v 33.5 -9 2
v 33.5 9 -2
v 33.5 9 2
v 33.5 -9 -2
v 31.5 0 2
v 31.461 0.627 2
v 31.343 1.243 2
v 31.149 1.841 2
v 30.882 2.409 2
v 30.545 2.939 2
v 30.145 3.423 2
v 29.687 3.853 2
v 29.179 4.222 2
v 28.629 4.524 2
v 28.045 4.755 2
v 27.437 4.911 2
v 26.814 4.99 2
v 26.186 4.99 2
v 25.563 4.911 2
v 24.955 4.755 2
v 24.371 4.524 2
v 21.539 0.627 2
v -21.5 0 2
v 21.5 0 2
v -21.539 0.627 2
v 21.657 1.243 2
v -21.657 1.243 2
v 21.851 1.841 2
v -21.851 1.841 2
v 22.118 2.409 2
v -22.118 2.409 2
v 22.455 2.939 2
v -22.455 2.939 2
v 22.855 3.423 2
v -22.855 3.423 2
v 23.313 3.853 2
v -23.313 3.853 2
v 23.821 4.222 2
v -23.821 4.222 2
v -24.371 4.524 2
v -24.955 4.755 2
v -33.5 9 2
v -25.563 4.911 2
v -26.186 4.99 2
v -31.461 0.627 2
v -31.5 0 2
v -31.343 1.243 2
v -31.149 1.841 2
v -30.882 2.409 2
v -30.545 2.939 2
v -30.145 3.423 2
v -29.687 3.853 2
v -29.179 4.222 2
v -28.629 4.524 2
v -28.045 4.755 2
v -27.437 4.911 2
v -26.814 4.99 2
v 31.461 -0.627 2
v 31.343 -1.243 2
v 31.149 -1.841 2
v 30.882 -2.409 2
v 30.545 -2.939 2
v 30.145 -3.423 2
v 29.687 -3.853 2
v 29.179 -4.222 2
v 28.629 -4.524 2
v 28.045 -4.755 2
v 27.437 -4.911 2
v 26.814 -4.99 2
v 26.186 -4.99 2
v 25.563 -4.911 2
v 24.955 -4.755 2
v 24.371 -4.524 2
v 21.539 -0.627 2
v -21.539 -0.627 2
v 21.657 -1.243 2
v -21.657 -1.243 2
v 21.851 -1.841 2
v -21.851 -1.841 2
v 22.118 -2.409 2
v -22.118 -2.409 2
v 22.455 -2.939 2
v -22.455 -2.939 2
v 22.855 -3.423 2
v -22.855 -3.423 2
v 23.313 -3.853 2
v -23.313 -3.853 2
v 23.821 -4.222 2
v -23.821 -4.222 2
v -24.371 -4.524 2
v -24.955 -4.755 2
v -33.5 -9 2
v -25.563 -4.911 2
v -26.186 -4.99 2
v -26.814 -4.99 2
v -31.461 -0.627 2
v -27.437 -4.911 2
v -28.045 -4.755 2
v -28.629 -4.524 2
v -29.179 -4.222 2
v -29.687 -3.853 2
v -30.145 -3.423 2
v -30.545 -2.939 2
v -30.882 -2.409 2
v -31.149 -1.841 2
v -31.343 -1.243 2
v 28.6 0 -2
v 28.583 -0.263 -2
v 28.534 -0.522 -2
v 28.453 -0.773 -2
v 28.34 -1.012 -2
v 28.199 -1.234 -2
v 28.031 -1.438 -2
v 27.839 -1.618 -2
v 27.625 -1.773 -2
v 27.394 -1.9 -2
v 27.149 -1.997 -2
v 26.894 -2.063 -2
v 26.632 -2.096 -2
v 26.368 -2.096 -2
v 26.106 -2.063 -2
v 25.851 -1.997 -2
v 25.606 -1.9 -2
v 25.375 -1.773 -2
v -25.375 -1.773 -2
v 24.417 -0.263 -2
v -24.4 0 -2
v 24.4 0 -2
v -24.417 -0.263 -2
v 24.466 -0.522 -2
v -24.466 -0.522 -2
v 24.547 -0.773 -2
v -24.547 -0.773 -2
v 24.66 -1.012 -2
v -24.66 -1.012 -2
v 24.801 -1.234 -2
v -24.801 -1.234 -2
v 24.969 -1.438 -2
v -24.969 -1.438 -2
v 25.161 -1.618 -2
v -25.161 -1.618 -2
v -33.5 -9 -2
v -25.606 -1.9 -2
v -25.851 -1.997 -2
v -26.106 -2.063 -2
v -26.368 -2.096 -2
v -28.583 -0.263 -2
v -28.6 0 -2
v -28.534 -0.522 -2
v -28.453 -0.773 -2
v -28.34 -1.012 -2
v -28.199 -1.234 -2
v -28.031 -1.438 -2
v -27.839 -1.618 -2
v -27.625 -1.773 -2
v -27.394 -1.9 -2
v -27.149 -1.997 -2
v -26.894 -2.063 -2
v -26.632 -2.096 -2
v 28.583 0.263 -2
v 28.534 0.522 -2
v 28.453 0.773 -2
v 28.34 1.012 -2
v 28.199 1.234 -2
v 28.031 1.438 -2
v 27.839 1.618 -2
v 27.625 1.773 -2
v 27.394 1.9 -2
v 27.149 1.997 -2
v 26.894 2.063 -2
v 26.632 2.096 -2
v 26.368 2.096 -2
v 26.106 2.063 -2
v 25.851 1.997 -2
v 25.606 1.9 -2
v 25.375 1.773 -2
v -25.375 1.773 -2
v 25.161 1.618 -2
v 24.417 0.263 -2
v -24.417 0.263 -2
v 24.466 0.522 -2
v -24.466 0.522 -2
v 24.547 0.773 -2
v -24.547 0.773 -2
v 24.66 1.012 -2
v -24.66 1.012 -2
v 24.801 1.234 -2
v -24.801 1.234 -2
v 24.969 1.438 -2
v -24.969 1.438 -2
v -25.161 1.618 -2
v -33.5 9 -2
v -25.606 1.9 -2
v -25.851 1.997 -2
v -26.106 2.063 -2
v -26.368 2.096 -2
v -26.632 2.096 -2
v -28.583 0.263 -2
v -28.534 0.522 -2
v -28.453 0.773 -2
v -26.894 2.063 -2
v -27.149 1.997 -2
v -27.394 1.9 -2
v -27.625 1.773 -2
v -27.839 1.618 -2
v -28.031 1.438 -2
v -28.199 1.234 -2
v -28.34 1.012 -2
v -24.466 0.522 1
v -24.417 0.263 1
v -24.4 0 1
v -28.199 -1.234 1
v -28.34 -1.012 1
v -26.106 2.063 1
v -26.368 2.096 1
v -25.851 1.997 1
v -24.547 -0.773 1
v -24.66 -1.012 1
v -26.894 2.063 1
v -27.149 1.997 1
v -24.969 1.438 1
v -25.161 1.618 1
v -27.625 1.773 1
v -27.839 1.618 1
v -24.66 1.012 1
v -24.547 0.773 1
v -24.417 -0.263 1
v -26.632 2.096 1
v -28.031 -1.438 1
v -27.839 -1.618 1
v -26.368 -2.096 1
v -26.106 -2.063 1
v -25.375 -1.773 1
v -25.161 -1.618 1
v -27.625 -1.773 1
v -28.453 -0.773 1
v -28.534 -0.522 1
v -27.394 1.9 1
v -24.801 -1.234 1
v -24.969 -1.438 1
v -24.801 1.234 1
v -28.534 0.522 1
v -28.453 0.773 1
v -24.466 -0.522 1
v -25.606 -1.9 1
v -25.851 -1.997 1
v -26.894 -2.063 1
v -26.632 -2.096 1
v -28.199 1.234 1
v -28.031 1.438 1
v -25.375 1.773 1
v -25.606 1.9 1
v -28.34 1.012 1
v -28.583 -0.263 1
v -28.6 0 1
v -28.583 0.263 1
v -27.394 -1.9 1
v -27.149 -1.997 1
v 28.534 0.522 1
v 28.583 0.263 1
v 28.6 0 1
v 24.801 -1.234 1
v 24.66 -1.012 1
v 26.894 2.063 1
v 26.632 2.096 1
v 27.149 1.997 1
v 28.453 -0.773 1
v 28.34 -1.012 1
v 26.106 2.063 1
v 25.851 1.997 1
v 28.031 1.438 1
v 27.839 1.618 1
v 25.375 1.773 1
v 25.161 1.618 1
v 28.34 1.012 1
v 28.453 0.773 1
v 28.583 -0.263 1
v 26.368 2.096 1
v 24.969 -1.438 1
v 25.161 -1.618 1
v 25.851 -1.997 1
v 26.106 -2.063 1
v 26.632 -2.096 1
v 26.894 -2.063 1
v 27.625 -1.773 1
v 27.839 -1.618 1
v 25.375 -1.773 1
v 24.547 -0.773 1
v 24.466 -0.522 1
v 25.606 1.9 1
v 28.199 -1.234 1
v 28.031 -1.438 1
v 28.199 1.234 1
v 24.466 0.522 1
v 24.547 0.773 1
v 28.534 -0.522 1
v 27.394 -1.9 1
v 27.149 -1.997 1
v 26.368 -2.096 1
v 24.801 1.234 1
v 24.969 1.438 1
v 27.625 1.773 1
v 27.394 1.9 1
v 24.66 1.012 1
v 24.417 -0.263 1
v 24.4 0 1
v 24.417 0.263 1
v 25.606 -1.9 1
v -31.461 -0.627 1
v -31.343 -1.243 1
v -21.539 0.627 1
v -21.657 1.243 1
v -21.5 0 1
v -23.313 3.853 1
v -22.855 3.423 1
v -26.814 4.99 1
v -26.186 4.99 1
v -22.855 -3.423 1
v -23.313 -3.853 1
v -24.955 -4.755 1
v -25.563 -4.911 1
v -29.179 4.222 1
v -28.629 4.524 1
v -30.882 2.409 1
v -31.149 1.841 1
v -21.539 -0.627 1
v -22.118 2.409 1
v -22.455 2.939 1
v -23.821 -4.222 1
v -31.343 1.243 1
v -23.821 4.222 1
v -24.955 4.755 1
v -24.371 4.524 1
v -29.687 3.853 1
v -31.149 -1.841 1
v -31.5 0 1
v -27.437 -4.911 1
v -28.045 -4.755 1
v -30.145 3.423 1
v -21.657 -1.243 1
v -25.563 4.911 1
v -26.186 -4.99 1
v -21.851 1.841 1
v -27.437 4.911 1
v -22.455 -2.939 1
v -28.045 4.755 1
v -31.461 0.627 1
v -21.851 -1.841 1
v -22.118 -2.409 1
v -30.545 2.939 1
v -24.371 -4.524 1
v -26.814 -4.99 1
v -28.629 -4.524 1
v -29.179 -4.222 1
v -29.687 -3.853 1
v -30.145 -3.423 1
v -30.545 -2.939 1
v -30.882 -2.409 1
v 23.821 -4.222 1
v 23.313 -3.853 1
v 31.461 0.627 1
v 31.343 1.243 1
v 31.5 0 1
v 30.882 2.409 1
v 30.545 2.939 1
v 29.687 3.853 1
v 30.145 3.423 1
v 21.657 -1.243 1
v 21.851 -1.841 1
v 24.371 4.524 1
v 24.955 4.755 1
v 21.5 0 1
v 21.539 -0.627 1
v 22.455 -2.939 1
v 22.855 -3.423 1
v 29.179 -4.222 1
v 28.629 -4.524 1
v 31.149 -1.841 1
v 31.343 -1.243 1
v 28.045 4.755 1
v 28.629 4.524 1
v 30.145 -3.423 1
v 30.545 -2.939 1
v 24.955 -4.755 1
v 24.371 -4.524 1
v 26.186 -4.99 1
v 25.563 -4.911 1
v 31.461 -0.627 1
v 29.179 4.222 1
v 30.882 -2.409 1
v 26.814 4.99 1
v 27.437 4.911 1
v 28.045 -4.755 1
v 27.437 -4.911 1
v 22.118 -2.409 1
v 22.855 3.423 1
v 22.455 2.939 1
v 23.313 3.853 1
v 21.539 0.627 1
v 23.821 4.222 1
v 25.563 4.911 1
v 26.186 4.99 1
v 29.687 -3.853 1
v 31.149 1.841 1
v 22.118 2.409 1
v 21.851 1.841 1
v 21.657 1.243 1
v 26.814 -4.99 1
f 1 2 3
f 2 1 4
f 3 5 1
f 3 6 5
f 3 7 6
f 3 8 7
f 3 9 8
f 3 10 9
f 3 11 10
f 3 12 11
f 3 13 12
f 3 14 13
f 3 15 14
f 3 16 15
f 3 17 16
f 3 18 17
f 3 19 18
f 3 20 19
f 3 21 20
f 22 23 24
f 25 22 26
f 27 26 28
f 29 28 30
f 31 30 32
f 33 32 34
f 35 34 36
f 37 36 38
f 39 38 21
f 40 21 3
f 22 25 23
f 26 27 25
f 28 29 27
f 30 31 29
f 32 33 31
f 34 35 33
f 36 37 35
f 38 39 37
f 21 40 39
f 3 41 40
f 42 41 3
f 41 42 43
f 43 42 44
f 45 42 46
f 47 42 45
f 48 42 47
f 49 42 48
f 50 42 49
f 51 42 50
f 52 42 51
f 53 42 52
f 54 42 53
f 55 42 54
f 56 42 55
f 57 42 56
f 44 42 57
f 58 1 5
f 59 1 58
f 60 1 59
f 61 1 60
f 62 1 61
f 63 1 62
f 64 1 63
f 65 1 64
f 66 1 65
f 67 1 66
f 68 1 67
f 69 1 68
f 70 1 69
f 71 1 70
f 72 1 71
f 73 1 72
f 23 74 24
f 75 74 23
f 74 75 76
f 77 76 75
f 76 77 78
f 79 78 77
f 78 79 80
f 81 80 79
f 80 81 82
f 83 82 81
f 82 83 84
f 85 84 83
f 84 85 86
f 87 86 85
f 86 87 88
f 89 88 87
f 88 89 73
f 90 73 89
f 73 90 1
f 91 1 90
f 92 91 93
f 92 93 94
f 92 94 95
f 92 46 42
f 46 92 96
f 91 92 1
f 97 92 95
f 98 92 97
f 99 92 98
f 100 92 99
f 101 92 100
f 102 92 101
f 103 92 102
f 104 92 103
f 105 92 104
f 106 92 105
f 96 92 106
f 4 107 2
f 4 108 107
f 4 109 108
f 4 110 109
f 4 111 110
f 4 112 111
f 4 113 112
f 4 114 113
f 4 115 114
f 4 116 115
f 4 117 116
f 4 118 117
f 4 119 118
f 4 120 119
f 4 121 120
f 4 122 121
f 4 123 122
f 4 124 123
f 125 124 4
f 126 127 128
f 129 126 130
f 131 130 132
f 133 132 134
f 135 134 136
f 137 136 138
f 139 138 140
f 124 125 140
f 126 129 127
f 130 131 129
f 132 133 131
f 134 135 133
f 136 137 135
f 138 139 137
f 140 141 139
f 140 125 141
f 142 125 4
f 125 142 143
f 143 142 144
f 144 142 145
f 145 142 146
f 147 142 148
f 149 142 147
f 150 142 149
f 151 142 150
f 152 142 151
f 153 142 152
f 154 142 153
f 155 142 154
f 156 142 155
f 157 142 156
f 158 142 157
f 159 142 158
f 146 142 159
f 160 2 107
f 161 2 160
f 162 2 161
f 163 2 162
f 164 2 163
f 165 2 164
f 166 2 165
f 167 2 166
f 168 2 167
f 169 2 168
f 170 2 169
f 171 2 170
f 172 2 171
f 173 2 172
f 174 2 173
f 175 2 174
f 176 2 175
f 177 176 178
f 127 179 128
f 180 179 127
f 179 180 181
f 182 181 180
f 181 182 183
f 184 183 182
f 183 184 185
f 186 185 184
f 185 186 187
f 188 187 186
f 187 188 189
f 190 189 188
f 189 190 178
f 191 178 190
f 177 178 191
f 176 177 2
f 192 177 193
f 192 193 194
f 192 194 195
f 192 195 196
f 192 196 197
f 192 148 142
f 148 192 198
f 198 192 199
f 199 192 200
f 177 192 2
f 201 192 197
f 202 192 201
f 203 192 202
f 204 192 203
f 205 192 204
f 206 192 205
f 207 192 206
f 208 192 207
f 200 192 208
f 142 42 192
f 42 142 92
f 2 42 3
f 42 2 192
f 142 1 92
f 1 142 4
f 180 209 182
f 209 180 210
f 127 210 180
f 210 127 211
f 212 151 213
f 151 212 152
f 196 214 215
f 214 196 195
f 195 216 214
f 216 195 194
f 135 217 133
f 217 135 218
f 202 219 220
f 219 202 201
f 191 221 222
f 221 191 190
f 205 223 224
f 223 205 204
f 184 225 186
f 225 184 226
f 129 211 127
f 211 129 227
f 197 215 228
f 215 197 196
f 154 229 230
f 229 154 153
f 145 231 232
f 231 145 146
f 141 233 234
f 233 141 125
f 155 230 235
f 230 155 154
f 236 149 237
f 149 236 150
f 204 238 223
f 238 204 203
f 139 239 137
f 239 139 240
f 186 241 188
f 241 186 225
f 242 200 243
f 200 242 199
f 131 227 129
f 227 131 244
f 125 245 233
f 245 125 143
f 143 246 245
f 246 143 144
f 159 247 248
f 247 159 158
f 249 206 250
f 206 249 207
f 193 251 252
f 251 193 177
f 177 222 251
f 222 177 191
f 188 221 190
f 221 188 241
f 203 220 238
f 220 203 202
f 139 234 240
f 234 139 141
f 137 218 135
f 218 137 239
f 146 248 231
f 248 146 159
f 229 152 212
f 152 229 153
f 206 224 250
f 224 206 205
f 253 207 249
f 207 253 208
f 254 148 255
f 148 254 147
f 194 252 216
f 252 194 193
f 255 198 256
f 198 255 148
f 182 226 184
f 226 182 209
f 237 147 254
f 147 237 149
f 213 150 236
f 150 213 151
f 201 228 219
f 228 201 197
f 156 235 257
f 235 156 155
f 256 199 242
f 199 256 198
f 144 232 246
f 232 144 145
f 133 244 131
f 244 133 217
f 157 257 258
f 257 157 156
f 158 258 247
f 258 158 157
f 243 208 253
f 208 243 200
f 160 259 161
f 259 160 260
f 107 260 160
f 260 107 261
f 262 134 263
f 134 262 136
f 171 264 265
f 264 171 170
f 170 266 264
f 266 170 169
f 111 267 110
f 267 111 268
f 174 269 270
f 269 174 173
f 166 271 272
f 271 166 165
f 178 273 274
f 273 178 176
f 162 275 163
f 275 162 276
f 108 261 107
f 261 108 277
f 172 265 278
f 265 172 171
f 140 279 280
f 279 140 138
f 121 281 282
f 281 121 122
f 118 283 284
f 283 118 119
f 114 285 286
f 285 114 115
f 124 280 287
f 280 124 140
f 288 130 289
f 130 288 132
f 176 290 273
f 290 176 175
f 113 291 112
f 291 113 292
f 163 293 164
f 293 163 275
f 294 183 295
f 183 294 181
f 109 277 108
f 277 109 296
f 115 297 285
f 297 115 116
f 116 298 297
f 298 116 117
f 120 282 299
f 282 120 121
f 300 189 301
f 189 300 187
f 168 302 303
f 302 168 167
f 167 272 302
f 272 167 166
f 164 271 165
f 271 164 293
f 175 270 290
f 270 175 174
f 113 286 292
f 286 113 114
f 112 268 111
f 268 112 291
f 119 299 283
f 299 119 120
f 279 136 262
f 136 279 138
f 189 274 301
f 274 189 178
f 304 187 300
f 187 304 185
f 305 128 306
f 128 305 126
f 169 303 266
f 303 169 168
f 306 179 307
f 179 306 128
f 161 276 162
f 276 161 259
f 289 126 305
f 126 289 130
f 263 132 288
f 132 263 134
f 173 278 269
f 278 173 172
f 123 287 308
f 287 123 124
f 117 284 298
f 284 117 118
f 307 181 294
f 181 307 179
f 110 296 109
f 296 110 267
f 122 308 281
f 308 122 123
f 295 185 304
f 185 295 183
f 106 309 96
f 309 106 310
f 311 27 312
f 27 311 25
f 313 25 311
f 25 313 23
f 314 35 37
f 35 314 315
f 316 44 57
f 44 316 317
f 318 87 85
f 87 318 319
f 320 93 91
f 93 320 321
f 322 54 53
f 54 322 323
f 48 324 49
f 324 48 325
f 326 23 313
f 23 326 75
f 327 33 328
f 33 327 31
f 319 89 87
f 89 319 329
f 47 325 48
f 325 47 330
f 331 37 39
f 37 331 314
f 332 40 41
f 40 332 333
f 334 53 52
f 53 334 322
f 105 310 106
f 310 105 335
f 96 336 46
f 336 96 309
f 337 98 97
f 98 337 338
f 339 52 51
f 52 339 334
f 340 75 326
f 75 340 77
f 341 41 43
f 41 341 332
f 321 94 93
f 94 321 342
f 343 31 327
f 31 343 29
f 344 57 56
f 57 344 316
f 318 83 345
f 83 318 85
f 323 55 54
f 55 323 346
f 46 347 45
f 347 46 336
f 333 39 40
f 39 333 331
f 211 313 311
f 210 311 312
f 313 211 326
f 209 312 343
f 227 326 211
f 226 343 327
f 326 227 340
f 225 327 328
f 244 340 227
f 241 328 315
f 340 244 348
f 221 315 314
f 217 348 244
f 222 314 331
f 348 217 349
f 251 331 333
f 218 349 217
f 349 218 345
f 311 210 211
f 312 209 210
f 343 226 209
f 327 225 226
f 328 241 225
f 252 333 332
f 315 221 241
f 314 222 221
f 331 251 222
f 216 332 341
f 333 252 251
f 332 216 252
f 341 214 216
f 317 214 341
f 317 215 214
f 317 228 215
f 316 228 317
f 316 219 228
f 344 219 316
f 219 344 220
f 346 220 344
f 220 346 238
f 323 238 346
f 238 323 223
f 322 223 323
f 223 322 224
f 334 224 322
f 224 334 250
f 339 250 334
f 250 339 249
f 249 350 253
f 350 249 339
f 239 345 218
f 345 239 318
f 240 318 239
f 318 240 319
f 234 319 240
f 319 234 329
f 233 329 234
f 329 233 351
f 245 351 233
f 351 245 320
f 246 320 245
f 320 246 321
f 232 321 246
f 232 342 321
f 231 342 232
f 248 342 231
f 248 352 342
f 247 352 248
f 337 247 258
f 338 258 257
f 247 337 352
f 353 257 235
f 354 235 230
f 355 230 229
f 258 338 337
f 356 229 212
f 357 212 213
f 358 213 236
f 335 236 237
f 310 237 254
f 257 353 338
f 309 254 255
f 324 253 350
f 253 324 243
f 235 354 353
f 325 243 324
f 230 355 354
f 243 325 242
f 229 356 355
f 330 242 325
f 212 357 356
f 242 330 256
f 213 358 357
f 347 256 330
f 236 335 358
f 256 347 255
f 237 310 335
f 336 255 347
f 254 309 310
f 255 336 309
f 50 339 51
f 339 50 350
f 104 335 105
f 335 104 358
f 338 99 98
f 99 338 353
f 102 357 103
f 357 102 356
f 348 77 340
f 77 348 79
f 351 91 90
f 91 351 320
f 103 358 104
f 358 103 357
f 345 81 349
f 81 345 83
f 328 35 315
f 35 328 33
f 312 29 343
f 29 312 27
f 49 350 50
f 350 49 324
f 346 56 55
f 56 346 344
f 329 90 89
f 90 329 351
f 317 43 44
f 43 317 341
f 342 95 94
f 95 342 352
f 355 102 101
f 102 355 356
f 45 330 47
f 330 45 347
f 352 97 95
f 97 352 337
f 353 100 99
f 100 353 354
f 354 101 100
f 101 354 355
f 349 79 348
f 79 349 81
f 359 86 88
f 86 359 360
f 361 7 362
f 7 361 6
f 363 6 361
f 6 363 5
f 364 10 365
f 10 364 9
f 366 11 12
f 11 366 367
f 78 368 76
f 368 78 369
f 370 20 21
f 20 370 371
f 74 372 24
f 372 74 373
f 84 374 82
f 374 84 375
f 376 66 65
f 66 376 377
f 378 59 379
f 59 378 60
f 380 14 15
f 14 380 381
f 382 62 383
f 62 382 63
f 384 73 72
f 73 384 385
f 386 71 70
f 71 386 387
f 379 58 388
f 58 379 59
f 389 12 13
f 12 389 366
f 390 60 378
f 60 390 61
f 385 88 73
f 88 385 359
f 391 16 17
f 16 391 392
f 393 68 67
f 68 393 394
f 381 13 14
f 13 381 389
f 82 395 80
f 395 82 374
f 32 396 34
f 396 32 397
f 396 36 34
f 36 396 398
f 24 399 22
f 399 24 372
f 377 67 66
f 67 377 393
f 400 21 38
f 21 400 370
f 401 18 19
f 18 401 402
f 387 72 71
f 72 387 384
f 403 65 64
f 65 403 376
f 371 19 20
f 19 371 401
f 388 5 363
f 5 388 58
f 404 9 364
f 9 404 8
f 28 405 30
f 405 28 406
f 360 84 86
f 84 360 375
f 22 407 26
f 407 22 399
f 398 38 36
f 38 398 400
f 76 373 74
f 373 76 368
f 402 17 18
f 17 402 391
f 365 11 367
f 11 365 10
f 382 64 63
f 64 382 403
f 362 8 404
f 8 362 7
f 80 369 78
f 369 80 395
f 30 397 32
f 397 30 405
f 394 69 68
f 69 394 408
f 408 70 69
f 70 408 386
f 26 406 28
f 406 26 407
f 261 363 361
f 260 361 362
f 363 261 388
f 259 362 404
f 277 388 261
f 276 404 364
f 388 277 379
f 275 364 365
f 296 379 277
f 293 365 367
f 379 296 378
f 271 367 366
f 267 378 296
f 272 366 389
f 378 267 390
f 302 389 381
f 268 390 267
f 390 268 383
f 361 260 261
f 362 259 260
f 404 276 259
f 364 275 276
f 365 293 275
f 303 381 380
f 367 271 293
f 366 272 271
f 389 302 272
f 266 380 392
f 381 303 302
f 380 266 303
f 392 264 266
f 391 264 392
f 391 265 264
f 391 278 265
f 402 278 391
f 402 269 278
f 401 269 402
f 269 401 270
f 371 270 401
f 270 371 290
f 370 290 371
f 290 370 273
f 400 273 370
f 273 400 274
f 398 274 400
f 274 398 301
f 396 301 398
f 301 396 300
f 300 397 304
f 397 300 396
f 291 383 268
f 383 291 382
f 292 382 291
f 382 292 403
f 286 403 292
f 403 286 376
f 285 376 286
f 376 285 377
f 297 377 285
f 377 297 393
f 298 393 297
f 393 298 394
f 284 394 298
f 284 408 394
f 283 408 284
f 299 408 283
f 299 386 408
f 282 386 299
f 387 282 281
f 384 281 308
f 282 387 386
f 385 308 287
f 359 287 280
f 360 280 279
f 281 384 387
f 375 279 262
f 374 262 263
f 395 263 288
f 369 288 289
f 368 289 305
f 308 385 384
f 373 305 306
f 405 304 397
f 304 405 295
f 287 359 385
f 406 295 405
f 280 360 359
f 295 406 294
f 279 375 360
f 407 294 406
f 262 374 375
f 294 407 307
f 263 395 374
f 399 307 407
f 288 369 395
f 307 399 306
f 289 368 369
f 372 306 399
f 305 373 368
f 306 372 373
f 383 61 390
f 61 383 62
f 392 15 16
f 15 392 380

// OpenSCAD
// under case plate
// for water flow meters

hole_center = 53;

// using M5
screw_dia = 5;
screw_pilot = 4.2;

countersink_dia = 10;
countersink_depth = 1;

plate_width = 18;
plate_length = hole_center + countersink_dia + 4;

plate_thickness = 4;

$fn = 50;

difference() {
    {
    cube ([plate_length, plate_width, plate_thickness], center = true);
    }
    {
    // holes
    translate([-hole_center/2, 0,0])
    cylinder(r = screw_pilot/2, h = plate_thickness, center = true);
        
    translate([hole_center/2, 0,0])
    cylinder(r = screw_pilot/2, h = plate_thickness, center = true);

    // countersink
    translate([-hole_center/2,0, plate_thickness/2 - countersink_depth/2])
    cylinder(r = countersink_dia/2, h = countersink_depth, center = true);
        
    // countersink
    translate([hole_center/2,0, plate_thickness/2 - countersink_depth/2])
    cylinder(r = countersink_dia/2, h = countersink_depth, center = true);
    }
}
